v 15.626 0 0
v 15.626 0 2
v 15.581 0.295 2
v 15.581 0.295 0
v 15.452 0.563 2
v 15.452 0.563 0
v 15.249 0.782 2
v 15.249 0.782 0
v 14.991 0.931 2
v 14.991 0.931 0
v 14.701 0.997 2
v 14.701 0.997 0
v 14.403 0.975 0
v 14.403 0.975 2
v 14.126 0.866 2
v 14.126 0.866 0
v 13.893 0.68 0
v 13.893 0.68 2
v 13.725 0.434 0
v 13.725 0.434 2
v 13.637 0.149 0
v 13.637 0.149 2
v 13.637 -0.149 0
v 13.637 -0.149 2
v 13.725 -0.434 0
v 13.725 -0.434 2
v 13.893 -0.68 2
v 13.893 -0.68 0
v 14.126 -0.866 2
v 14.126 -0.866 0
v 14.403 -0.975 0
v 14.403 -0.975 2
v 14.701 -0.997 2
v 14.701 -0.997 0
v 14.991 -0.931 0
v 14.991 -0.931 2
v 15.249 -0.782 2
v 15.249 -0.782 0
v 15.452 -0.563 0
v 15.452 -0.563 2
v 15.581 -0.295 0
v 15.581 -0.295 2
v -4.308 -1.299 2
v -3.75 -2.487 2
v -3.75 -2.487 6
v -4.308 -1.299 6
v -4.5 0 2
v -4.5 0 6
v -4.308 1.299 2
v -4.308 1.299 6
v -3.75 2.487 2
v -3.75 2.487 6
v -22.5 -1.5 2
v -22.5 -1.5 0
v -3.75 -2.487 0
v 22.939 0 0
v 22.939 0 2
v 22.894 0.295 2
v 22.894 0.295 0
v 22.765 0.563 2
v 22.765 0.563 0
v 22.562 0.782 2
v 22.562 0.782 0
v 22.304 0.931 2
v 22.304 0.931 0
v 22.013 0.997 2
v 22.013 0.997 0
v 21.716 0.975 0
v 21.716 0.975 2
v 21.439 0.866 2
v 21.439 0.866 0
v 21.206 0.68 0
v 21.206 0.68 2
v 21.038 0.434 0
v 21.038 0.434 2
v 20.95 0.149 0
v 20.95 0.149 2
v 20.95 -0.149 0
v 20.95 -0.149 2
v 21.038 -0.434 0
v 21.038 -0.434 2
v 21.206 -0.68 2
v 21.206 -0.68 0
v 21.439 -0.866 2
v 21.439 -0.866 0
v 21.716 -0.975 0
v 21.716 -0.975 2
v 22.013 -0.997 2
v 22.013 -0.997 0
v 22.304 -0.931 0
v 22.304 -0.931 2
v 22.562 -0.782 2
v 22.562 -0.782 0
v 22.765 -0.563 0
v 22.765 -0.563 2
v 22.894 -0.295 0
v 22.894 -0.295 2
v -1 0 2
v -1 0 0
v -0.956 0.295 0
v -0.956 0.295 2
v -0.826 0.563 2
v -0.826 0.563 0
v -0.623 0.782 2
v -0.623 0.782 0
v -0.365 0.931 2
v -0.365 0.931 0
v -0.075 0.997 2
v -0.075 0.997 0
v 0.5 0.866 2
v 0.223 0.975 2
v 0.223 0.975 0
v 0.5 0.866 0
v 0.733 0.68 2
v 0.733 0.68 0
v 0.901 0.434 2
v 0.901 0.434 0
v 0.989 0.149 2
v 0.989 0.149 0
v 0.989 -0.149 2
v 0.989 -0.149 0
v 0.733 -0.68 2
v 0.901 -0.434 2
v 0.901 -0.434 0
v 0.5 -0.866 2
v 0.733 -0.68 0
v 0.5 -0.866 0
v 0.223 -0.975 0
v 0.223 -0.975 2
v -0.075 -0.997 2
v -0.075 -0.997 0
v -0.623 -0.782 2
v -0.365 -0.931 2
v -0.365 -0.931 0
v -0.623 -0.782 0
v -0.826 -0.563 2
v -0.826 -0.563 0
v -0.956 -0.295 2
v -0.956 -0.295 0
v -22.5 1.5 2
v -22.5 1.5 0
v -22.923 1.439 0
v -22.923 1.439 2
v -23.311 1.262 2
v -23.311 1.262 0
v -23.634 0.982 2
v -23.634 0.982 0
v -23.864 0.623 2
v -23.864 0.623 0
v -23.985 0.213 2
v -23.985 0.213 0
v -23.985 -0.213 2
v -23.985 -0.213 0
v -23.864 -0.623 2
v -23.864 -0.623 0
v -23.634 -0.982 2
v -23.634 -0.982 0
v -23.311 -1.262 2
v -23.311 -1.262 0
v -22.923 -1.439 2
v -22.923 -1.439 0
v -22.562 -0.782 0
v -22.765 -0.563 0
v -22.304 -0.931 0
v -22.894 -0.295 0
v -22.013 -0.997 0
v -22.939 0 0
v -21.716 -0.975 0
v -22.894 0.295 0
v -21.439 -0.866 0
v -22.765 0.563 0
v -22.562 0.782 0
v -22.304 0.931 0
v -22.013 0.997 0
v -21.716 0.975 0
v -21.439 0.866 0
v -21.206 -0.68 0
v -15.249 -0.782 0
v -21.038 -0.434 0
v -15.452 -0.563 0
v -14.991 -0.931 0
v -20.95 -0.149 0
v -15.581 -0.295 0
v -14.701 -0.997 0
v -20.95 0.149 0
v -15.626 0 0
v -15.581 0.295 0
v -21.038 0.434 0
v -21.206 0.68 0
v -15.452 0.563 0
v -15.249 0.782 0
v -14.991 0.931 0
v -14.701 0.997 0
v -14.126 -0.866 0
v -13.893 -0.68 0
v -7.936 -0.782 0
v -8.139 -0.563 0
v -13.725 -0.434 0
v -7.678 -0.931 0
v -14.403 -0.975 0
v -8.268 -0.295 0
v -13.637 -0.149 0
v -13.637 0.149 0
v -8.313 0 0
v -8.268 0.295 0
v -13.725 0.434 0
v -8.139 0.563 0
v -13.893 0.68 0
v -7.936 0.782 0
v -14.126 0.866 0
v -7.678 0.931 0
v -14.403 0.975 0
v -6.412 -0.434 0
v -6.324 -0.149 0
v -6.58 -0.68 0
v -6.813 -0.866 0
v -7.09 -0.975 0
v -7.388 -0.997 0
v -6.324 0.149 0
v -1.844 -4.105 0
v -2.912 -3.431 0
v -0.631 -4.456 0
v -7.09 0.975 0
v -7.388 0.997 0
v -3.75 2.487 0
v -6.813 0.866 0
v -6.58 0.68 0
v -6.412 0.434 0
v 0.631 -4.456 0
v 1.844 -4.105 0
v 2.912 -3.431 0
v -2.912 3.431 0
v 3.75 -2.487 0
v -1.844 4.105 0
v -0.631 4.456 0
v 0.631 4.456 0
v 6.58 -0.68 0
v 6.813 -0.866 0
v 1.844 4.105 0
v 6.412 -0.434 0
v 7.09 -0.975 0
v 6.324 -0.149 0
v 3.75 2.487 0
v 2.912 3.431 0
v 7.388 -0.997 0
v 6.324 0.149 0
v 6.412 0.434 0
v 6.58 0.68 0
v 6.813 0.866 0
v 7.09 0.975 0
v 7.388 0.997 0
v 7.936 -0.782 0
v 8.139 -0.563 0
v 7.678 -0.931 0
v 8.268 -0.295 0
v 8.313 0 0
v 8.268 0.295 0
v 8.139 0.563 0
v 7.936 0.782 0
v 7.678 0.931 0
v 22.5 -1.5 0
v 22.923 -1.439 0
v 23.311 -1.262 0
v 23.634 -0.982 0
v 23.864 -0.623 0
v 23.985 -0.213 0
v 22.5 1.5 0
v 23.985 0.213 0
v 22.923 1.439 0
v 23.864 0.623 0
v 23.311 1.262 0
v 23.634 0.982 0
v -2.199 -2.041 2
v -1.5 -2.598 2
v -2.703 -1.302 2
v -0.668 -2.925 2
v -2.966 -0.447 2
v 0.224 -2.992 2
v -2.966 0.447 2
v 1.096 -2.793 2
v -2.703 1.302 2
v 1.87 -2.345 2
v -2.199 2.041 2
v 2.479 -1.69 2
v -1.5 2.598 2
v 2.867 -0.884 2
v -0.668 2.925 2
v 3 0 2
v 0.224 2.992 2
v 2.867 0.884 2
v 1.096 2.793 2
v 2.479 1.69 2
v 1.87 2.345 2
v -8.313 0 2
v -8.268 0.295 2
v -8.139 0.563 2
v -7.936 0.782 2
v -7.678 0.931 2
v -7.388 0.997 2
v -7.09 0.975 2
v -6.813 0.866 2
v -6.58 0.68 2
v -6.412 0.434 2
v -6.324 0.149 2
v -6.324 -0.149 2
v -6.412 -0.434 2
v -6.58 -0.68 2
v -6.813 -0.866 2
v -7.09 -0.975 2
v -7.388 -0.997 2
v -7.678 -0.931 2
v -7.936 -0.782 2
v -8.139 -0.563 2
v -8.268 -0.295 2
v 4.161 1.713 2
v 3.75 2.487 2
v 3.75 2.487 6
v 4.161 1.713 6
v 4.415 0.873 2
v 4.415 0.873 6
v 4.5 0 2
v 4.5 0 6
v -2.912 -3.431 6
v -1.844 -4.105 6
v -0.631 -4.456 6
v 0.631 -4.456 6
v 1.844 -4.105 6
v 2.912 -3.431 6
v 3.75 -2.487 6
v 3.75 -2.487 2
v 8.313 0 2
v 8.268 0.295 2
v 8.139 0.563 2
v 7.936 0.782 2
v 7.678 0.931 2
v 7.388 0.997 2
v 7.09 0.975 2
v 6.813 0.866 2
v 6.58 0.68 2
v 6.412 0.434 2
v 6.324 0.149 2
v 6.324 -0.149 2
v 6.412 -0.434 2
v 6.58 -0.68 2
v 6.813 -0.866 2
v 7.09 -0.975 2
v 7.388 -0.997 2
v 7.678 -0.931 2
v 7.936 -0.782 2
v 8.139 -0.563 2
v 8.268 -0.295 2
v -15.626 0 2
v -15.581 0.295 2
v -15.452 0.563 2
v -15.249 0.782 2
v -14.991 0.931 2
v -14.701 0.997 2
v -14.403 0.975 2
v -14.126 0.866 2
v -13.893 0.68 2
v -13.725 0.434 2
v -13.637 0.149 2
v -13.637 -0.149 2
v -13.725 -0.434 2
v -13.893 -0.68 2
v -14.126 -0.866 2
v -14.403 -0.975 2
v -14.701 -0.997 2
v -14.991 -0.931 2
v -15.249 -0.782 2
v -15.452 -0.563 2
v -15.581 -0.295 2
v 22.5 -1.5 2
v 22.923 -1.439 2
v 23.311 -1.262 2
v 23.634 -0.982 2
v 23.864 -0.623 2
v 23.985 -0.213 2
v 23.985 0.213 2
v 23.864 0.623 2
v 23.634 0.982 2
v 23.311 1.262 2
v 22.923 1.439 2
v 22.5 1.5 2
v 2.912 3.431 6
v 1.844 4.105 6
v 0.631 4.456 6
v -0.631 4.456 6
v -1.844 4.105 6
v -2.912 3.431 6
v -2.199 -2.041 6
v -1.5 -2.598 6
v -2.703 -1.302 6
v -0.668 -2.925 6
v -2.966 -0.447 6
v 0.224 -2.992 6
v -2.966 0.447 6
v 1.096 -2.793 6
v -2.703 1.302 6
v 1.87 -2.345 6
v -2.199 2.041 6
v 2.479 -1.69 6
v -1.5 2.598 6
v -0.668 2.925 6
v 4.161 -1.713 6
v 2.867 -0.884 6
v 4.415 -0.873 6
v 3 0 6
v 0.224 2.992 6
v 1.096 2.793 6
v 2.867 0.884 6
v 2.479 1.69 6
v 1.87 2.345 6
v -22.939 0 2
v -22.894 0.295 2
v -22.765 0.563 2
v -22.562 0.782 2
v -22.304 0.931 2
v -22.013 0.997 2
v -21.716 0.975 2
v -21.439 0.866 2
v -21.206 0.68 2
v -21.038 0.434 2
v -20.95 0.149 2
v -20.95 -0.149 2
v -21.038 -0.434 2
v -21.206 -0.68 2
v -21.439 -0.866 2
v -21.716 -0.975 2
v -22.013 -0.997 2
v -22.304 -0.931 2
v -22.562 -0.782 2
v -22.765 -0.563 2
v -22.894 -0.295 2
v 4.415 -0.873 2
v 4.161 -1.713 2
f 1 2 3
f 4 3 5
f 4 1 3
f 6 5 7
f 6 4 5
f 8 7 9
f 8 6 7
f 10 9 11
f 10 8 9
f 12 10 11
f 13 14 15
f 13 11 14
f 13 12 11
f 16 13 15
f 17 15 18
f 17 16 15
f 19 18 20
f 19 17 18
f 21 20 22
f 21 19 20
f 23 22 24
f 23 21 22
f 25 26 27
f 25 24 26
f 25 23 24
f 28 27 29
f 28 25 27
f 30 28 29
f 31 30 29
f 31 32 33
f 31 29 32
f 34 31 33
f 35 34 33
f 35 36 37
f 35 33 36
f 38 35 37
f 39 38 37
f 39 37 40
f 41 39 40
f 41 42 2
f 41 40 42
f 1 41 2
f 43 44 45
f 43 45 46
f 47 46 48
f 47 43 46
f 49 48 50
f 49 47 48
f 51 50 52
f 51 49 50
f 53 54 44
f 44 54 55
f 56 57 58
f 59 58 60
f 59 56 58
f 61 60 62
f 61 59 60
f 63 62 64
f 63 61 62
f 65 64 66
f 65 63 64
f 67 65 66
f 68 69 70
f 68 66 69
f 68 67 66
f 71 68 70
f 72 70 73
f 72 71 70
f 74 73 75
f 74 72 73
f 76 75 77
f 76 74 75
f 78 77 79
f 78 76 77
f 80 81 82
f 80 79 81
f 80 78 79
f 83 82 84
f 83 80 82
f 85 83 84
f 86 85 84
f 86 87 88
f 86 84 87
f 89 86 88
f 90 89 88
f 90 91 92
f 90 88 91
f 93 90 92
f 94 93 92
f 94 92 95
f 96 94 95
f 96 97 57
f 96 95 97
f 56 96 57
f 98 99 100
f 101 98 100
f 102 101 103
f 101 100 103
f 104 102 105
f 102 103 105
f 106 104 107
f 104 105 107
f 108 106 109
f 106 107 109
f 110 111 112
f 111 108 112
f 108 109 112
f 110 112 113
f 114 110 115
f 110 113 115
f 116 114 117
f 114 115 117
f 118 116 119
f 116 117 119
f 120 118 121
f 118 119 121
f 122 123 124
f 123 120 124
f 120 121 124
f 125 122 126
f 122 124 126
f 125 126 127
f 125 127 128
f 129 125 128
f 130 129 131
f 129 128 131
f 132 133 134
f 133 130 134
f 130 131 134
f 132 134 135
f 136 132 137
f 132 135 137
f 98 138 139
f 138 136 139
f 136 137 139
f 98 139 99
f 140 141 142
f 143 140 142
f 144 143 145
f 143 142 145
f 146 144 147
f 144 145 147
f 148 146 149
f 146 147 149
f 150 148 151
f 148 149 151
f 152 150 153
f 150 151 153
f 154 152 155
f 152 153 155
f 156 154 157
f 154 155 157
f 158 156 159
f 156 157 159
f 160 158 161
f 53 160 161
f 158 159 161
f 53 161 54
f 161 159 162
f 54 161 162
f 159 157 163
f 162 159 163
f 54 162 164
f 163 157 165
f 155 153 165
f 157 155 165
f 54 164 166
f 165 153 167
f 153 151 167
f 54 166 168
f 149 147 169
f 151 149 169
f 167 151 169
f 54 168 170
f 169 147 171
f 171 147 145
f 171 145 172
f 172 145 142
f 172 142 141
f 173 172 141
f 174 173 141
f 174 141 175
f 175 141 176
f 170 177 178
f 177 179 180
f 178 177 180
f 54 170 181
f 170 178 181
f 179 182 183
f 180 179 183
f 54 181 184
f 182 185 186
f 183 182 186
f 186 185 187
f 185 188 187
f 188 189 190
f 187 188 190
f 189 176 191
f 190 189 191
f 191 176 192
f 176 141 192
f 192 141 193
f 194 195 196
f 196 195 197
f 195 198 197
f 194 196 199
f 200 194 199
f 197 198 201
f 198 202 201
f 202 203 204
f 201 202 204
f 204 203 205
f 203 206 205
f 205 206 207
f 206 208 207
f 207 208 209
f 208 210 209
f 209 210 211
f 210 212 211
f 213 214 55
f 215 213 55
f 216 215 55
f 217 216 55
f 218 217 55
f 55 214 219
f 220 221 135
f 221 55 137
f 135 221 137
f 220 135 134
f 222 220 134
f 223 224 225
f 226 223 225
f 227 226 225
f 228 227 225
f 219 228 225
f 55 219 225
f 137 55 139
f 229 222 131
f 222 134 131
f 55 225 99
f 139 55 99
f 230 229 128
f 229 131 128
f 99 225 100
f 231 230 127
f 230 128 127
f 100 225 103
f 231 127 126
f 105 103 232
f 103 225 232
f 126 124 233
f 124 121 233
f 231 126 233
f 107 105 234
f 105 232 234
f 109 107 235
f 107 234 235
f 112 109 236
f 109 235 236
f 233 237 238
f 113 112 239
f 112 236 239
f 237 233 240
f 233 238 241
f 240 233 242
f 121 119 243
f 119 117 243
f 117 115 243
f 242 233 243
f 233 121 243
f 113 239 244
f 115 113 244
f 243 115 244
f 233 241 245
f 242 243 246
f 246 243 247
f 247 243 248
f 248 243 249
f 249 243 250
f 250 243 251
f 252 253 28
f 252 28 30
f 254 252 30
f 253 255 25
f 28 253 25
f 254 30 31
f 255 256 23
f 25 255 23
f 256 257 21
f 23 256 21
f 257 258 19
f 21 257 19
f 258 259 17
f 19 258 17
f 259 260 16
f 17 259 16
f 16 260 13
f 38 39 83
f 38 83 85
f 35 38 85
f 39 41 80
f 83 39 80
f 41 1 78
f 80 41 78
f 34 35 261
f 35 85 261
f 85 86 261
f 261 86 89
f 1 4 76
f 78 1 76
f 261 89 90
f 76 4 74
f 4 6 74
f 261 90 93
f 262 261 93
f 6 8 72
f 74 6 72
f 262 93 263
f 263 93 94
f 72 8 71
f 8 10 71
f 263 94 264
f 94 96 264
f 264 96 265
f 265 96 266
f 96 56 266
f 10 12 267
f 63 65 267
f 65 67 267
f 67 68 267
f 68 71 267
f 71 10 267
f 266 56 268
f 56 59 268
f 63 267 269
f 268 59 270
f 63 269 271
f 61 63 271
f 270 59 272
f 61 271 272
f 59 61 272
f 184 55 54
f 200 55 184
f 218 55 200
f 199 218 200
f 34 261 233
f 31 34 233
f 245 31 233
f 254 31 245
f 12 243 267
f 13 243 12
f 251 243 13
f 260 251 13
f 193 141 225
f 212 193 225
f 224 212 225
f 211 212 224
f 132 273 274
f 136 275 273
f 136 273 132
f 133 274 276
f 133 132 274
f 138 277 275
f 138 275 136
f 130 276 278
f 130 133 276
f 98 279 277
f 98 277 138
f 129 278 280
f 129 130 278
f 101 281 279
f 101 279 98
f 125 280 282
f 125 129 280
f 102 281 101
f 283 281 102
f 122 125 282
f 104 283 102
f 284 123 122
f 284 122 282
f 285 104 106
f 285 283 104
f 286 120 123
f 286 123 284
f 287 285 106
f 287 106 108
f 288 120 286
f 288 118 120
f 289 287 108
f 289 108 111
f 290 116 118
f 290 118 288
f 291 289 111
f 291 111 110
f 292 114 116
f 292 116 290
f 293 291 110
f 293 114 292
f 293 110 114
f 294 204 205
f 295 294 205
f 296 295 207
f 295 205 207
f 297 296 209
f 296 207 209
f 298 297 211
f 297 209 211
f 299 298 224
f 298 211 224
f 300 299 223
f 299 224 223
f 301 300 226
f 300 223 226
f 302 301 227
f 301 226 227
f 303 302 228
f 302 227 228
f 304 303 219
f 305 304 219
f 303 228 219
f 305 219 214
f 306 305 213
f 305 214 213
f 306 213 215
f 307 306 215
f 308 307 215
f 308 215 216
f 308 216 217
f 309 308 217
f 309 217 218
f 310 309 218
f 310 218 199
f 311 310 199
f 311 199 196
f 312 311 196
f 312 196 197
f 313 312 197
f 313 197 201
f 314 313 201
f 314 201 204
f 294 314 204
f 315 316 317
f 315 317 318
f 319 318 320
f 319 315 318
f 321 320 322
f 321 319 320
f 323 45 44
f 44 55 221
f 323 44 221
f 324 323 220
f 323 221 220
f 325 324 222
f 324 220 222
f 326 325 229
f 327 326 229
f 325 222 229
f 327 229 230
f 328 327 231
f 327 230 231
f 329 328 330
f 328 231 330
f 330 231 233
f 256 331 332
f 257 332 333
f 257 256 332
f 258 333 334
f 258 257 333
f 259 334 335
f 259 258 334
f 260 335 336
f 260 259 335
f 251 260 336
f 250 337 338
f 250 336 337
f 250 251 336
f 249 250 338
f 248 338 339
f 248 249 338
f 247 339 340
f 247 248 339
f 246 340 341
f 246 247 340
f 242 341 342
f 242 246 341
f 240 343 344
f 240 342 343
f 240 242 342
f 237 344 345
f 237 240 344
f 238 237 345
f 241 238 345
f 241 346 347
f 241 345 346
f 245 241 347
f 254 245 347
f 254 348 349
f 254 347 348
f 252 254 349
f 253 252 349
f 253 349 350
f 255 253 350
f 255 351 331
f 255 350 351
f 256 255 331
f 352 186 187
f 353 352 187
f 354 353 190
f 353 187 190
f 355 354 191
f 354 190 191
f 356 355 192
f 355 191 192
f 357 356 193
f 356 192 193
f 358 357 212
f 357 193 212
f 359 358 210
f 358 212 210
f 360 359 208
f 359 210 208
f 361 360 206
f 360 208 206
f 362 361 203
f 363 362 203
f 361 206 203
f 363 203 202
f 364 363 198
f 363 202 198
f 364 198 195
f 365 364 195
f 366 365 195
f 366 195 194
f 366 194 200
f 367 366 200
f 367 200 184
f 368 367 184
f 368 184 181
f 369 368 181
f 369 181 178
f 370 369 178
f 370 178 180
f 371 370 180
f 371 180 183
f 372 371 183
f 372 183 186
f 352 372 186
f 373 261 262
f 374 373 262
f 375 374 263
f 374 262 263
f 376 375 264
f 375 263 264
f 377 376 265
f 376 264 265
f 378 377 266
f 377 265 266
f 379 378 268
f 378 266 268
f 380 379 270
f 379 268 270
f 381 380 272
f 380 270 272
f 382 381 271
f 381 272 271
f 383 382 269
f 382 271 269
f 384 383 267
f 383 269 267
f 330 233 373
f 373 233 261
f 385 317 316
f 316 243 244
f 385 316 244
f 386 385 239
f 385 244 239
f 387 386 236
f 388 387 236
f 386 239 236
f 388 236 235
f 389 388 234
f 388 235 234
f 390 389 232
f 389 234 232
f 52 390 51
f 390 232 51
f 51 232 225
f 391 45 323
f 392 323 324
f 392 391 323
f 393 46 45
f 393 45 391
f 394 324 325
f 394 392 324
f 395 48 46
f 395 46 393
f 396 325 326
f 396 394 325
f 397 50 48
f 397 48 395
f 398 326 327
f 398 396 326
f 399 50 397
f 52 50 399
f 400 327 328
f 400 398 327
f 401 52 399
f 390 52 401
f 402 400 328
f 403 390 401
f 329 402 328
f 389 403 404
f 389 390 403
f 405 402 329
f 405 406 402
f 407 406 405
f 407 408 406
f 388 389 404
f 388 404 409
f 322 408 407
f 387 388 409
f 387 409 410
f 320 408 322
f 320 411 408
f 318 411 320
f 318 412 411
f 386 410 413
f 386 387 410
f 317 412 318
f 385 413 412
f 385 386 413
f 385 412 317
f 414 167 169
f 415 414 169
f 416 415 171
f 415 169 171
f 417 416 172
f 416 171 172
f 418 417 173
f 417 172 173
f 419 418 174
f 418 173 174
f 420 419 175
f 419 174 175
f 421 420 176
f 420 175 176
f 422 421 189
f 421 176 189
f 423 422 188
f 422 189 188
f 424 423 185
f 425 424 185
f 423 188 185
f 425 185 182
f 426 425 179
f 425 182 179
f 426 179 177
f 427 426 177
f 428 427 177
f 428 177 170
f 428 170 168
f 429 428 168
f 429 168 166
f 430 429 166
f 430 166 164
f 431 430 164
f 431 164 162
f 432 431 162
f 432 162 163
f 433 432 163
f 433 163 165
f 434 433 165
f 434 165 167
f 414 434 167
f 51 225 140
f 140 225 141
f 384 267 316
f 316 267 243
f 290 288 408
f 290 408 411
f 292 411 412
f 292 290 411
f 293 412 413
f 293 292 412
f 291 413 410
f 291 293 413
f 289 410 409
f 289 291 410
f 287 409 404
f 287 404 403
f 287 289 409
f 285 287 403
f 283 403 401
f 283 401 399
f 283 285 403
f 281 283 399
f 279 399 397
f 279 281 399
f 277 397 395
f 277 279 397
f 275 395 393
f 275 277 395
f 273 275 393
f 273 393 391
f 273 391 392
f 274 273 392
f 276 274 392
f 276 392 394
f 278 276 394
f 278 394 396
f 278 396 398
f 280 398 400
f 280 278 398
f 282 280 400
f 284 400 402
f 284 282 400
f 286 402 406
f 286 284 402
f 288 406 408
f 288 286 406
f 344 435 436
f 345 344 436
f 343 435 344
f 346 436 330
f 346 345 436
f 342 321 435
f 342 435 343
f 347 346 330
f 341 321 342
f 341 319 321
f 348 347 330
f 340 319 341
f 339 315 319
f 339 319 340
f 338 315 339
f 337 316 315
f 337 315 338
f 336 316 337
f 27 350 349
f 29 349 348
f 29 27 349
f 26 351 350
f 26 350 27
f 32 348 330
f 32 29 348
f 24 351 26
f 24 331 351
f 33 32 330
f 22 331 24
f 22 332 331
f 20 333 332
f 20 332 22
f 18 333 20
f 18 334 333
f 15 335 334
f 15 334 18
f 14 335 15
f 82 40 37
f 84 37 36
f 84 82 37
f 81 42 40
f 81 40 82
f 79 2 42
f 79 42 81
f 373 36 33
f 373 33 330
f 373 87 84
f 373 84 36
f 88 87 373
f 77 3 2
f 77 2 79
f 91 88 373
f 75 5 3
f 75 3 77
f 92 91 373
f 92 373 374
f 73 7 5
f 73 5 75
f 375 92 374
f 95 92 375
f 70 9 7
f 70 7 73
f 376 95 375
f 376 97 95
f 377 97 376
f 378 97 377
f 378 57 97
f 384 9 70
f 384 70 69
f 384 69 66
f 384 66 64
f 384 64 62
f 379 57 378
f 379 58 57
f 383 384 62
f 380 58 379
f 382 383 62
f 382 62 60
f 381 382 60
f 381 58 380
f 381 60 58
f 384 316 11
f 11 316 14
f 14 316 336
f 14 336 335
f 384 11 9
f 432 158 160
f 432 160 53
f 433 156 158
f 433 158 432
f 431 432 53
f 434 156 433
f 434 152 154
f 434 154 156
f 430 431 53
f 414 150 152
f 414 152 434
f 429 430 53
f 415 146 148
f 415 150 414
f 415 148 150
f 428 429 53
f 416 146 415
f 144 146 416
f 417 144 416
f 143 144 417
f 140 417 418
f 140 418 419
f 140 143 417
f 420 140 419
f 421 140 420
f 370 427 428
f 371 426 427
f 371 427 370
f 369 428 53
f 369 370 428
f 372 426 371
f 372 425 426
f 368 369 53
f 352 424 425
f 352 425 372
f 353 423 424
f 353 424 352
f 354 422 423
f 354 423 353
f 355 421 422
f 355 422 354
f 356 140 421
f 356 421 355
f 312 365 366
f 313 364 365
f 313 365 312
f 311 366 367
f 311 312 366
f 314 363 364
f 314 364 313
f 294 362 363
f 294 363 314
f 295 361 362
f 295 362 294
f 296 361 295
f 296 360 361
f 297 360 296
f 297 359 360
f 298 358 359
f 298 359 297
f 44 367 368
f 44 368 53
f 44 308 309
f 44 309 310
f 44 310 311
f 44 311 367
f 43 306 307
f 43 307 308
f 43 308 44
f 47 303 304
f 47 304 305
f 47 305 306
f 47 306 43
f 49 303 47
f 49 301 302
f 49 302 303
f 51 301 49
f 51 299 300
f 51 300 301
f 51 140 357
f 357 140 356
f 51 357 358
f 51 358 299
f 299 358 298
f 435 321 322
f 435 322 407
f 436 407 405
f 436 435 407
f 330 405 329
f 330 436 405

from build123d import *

# Parameters (mm, degrees)
SKETCH1_R           = 1.5
SKETCH1_R_2         = 4.5
BOSS_EXTRUDE1_DEPTH = 6
CUT_EXTRUDE1_START  = -4
SKETCH3_R           = 3
CUT_EXTRUDE1_DEPTH  = 4
SKETCH4_R           = 1
CUT_EXTRUDE2_DEPTH  = 10


with BuildPart() as part:
    # Sketch1 → Boss-Extrude1 (new body)
    with BuildSketch(Plane.XY):
        with Locations((-22.5, 0)):
            Circle(SKETCH1_R)
        with BuildLine():
            Line((-3.75, 2.487468593), (-22.5, 1.5))
            ThreePointArc((-22.5, 1.5), (-21.439339828, 1.060660172), (-21, 0))
            ThreePointArc((-21, 0), (-21.439339828, -1.060660172), (-22.5, -1.5))
            Line((-22.5, -1.5), (-3.75, -2.487468593))
            ThreePointArc((-3.75, -2.487468593), (-4.5, 0), (-3.75, 2.487468593))
        make_face()
        Circle(SKETCH1_R_2)
        with BuildLine():
            ThreePointArc((22.5, -1.5), (21, 0), (22.5, 1.5))
            Line((22.5, 1.5), (3.75, 2.487468593))
            ThreePointArc((3.75, 2.487468593), (4.308421985, 1.299038106), (4.5, 0))
            ThreePointArc((4.5, 0), (4.308421985, -1.299038106), (3.75, -2.487468593))
            Line((3.75, -2.487468593), (22.5, -1.5))
        make_face()
        with Locations((22.5, 0)):
            Circle(SKETCH1_R)
    extrude(amount=BOSS_EXTRUDE1_DEPTH)

    # Sketch3 → Cut-Extrude1 (cut)
    with BuildSketch(Plane.XY.offset(6).offset(CUT_EXTRUDE1_START)):
        with BuildLine():
            ThreePointArc((-22.5, 1.5), (-24, 0), (-22.5, -1.5))
            Line((-22.5, -1.5), (-3.75, -2.487468593))
            ThreePointArc((-3.75, -2.487468593), (-4.5, 0), (-3.75, 2.487468593))
            Line((-3.75, 2.487468593), (-22.5, 1.5))
        make_face()
        with BuildLine():
            ThreePointArc((4.5, 0), (4.308421985, -1.299038106), (3.75, -2.487468593))
            Line((3.75, -2.487468593), (22.5, -1.5))
            ThreePointArc((22.5, -1.5), (24, 0), (22.5, 1.5))
            Line((22.5, 1.5), (3.75, 2.487468593))
            ThreePointArc((3.75, 2.487468593), (4.308421985, 1.299038106), (4.5, 0))
        make_face()
        Circle(SKETCH3_R)
    extrude(amount=CUT_EXTRUDE1_DEPTH, mode=Mode.SUBTRACT)

    # Sketch4 → Cut-Extrude2 (cut)
    with BuildSketch(Plane(origin=(0, 0, 0), x_dir=(-1, 0, 0), z_dir=(0, 0, -1))):
        Circle(SKETCH4_R)
        with Locations((7.312902248, 0)):
            Circle(SKETCH4_R)
        with Locations((14.625804497, 0)):
            Circle(SKETCH4_R)
        with Locations((21.938706745, 0)):
            Circle(SKETCH4_R)
    cut_extrude2 = extrude(amount=-CUT_EXTRUDE2_DEPTH, mode=Mode.SUBTRACT)

    # Mirror1: Cut-Extrude2 across plane
    add(cut_extrude2.mirror(Plane(origin=(0, 0, 0), x_dir=(0, 0, 1), z_dir=(1, 0, 0))), mode=Mode.SUBTRACT)


solid = part.part
